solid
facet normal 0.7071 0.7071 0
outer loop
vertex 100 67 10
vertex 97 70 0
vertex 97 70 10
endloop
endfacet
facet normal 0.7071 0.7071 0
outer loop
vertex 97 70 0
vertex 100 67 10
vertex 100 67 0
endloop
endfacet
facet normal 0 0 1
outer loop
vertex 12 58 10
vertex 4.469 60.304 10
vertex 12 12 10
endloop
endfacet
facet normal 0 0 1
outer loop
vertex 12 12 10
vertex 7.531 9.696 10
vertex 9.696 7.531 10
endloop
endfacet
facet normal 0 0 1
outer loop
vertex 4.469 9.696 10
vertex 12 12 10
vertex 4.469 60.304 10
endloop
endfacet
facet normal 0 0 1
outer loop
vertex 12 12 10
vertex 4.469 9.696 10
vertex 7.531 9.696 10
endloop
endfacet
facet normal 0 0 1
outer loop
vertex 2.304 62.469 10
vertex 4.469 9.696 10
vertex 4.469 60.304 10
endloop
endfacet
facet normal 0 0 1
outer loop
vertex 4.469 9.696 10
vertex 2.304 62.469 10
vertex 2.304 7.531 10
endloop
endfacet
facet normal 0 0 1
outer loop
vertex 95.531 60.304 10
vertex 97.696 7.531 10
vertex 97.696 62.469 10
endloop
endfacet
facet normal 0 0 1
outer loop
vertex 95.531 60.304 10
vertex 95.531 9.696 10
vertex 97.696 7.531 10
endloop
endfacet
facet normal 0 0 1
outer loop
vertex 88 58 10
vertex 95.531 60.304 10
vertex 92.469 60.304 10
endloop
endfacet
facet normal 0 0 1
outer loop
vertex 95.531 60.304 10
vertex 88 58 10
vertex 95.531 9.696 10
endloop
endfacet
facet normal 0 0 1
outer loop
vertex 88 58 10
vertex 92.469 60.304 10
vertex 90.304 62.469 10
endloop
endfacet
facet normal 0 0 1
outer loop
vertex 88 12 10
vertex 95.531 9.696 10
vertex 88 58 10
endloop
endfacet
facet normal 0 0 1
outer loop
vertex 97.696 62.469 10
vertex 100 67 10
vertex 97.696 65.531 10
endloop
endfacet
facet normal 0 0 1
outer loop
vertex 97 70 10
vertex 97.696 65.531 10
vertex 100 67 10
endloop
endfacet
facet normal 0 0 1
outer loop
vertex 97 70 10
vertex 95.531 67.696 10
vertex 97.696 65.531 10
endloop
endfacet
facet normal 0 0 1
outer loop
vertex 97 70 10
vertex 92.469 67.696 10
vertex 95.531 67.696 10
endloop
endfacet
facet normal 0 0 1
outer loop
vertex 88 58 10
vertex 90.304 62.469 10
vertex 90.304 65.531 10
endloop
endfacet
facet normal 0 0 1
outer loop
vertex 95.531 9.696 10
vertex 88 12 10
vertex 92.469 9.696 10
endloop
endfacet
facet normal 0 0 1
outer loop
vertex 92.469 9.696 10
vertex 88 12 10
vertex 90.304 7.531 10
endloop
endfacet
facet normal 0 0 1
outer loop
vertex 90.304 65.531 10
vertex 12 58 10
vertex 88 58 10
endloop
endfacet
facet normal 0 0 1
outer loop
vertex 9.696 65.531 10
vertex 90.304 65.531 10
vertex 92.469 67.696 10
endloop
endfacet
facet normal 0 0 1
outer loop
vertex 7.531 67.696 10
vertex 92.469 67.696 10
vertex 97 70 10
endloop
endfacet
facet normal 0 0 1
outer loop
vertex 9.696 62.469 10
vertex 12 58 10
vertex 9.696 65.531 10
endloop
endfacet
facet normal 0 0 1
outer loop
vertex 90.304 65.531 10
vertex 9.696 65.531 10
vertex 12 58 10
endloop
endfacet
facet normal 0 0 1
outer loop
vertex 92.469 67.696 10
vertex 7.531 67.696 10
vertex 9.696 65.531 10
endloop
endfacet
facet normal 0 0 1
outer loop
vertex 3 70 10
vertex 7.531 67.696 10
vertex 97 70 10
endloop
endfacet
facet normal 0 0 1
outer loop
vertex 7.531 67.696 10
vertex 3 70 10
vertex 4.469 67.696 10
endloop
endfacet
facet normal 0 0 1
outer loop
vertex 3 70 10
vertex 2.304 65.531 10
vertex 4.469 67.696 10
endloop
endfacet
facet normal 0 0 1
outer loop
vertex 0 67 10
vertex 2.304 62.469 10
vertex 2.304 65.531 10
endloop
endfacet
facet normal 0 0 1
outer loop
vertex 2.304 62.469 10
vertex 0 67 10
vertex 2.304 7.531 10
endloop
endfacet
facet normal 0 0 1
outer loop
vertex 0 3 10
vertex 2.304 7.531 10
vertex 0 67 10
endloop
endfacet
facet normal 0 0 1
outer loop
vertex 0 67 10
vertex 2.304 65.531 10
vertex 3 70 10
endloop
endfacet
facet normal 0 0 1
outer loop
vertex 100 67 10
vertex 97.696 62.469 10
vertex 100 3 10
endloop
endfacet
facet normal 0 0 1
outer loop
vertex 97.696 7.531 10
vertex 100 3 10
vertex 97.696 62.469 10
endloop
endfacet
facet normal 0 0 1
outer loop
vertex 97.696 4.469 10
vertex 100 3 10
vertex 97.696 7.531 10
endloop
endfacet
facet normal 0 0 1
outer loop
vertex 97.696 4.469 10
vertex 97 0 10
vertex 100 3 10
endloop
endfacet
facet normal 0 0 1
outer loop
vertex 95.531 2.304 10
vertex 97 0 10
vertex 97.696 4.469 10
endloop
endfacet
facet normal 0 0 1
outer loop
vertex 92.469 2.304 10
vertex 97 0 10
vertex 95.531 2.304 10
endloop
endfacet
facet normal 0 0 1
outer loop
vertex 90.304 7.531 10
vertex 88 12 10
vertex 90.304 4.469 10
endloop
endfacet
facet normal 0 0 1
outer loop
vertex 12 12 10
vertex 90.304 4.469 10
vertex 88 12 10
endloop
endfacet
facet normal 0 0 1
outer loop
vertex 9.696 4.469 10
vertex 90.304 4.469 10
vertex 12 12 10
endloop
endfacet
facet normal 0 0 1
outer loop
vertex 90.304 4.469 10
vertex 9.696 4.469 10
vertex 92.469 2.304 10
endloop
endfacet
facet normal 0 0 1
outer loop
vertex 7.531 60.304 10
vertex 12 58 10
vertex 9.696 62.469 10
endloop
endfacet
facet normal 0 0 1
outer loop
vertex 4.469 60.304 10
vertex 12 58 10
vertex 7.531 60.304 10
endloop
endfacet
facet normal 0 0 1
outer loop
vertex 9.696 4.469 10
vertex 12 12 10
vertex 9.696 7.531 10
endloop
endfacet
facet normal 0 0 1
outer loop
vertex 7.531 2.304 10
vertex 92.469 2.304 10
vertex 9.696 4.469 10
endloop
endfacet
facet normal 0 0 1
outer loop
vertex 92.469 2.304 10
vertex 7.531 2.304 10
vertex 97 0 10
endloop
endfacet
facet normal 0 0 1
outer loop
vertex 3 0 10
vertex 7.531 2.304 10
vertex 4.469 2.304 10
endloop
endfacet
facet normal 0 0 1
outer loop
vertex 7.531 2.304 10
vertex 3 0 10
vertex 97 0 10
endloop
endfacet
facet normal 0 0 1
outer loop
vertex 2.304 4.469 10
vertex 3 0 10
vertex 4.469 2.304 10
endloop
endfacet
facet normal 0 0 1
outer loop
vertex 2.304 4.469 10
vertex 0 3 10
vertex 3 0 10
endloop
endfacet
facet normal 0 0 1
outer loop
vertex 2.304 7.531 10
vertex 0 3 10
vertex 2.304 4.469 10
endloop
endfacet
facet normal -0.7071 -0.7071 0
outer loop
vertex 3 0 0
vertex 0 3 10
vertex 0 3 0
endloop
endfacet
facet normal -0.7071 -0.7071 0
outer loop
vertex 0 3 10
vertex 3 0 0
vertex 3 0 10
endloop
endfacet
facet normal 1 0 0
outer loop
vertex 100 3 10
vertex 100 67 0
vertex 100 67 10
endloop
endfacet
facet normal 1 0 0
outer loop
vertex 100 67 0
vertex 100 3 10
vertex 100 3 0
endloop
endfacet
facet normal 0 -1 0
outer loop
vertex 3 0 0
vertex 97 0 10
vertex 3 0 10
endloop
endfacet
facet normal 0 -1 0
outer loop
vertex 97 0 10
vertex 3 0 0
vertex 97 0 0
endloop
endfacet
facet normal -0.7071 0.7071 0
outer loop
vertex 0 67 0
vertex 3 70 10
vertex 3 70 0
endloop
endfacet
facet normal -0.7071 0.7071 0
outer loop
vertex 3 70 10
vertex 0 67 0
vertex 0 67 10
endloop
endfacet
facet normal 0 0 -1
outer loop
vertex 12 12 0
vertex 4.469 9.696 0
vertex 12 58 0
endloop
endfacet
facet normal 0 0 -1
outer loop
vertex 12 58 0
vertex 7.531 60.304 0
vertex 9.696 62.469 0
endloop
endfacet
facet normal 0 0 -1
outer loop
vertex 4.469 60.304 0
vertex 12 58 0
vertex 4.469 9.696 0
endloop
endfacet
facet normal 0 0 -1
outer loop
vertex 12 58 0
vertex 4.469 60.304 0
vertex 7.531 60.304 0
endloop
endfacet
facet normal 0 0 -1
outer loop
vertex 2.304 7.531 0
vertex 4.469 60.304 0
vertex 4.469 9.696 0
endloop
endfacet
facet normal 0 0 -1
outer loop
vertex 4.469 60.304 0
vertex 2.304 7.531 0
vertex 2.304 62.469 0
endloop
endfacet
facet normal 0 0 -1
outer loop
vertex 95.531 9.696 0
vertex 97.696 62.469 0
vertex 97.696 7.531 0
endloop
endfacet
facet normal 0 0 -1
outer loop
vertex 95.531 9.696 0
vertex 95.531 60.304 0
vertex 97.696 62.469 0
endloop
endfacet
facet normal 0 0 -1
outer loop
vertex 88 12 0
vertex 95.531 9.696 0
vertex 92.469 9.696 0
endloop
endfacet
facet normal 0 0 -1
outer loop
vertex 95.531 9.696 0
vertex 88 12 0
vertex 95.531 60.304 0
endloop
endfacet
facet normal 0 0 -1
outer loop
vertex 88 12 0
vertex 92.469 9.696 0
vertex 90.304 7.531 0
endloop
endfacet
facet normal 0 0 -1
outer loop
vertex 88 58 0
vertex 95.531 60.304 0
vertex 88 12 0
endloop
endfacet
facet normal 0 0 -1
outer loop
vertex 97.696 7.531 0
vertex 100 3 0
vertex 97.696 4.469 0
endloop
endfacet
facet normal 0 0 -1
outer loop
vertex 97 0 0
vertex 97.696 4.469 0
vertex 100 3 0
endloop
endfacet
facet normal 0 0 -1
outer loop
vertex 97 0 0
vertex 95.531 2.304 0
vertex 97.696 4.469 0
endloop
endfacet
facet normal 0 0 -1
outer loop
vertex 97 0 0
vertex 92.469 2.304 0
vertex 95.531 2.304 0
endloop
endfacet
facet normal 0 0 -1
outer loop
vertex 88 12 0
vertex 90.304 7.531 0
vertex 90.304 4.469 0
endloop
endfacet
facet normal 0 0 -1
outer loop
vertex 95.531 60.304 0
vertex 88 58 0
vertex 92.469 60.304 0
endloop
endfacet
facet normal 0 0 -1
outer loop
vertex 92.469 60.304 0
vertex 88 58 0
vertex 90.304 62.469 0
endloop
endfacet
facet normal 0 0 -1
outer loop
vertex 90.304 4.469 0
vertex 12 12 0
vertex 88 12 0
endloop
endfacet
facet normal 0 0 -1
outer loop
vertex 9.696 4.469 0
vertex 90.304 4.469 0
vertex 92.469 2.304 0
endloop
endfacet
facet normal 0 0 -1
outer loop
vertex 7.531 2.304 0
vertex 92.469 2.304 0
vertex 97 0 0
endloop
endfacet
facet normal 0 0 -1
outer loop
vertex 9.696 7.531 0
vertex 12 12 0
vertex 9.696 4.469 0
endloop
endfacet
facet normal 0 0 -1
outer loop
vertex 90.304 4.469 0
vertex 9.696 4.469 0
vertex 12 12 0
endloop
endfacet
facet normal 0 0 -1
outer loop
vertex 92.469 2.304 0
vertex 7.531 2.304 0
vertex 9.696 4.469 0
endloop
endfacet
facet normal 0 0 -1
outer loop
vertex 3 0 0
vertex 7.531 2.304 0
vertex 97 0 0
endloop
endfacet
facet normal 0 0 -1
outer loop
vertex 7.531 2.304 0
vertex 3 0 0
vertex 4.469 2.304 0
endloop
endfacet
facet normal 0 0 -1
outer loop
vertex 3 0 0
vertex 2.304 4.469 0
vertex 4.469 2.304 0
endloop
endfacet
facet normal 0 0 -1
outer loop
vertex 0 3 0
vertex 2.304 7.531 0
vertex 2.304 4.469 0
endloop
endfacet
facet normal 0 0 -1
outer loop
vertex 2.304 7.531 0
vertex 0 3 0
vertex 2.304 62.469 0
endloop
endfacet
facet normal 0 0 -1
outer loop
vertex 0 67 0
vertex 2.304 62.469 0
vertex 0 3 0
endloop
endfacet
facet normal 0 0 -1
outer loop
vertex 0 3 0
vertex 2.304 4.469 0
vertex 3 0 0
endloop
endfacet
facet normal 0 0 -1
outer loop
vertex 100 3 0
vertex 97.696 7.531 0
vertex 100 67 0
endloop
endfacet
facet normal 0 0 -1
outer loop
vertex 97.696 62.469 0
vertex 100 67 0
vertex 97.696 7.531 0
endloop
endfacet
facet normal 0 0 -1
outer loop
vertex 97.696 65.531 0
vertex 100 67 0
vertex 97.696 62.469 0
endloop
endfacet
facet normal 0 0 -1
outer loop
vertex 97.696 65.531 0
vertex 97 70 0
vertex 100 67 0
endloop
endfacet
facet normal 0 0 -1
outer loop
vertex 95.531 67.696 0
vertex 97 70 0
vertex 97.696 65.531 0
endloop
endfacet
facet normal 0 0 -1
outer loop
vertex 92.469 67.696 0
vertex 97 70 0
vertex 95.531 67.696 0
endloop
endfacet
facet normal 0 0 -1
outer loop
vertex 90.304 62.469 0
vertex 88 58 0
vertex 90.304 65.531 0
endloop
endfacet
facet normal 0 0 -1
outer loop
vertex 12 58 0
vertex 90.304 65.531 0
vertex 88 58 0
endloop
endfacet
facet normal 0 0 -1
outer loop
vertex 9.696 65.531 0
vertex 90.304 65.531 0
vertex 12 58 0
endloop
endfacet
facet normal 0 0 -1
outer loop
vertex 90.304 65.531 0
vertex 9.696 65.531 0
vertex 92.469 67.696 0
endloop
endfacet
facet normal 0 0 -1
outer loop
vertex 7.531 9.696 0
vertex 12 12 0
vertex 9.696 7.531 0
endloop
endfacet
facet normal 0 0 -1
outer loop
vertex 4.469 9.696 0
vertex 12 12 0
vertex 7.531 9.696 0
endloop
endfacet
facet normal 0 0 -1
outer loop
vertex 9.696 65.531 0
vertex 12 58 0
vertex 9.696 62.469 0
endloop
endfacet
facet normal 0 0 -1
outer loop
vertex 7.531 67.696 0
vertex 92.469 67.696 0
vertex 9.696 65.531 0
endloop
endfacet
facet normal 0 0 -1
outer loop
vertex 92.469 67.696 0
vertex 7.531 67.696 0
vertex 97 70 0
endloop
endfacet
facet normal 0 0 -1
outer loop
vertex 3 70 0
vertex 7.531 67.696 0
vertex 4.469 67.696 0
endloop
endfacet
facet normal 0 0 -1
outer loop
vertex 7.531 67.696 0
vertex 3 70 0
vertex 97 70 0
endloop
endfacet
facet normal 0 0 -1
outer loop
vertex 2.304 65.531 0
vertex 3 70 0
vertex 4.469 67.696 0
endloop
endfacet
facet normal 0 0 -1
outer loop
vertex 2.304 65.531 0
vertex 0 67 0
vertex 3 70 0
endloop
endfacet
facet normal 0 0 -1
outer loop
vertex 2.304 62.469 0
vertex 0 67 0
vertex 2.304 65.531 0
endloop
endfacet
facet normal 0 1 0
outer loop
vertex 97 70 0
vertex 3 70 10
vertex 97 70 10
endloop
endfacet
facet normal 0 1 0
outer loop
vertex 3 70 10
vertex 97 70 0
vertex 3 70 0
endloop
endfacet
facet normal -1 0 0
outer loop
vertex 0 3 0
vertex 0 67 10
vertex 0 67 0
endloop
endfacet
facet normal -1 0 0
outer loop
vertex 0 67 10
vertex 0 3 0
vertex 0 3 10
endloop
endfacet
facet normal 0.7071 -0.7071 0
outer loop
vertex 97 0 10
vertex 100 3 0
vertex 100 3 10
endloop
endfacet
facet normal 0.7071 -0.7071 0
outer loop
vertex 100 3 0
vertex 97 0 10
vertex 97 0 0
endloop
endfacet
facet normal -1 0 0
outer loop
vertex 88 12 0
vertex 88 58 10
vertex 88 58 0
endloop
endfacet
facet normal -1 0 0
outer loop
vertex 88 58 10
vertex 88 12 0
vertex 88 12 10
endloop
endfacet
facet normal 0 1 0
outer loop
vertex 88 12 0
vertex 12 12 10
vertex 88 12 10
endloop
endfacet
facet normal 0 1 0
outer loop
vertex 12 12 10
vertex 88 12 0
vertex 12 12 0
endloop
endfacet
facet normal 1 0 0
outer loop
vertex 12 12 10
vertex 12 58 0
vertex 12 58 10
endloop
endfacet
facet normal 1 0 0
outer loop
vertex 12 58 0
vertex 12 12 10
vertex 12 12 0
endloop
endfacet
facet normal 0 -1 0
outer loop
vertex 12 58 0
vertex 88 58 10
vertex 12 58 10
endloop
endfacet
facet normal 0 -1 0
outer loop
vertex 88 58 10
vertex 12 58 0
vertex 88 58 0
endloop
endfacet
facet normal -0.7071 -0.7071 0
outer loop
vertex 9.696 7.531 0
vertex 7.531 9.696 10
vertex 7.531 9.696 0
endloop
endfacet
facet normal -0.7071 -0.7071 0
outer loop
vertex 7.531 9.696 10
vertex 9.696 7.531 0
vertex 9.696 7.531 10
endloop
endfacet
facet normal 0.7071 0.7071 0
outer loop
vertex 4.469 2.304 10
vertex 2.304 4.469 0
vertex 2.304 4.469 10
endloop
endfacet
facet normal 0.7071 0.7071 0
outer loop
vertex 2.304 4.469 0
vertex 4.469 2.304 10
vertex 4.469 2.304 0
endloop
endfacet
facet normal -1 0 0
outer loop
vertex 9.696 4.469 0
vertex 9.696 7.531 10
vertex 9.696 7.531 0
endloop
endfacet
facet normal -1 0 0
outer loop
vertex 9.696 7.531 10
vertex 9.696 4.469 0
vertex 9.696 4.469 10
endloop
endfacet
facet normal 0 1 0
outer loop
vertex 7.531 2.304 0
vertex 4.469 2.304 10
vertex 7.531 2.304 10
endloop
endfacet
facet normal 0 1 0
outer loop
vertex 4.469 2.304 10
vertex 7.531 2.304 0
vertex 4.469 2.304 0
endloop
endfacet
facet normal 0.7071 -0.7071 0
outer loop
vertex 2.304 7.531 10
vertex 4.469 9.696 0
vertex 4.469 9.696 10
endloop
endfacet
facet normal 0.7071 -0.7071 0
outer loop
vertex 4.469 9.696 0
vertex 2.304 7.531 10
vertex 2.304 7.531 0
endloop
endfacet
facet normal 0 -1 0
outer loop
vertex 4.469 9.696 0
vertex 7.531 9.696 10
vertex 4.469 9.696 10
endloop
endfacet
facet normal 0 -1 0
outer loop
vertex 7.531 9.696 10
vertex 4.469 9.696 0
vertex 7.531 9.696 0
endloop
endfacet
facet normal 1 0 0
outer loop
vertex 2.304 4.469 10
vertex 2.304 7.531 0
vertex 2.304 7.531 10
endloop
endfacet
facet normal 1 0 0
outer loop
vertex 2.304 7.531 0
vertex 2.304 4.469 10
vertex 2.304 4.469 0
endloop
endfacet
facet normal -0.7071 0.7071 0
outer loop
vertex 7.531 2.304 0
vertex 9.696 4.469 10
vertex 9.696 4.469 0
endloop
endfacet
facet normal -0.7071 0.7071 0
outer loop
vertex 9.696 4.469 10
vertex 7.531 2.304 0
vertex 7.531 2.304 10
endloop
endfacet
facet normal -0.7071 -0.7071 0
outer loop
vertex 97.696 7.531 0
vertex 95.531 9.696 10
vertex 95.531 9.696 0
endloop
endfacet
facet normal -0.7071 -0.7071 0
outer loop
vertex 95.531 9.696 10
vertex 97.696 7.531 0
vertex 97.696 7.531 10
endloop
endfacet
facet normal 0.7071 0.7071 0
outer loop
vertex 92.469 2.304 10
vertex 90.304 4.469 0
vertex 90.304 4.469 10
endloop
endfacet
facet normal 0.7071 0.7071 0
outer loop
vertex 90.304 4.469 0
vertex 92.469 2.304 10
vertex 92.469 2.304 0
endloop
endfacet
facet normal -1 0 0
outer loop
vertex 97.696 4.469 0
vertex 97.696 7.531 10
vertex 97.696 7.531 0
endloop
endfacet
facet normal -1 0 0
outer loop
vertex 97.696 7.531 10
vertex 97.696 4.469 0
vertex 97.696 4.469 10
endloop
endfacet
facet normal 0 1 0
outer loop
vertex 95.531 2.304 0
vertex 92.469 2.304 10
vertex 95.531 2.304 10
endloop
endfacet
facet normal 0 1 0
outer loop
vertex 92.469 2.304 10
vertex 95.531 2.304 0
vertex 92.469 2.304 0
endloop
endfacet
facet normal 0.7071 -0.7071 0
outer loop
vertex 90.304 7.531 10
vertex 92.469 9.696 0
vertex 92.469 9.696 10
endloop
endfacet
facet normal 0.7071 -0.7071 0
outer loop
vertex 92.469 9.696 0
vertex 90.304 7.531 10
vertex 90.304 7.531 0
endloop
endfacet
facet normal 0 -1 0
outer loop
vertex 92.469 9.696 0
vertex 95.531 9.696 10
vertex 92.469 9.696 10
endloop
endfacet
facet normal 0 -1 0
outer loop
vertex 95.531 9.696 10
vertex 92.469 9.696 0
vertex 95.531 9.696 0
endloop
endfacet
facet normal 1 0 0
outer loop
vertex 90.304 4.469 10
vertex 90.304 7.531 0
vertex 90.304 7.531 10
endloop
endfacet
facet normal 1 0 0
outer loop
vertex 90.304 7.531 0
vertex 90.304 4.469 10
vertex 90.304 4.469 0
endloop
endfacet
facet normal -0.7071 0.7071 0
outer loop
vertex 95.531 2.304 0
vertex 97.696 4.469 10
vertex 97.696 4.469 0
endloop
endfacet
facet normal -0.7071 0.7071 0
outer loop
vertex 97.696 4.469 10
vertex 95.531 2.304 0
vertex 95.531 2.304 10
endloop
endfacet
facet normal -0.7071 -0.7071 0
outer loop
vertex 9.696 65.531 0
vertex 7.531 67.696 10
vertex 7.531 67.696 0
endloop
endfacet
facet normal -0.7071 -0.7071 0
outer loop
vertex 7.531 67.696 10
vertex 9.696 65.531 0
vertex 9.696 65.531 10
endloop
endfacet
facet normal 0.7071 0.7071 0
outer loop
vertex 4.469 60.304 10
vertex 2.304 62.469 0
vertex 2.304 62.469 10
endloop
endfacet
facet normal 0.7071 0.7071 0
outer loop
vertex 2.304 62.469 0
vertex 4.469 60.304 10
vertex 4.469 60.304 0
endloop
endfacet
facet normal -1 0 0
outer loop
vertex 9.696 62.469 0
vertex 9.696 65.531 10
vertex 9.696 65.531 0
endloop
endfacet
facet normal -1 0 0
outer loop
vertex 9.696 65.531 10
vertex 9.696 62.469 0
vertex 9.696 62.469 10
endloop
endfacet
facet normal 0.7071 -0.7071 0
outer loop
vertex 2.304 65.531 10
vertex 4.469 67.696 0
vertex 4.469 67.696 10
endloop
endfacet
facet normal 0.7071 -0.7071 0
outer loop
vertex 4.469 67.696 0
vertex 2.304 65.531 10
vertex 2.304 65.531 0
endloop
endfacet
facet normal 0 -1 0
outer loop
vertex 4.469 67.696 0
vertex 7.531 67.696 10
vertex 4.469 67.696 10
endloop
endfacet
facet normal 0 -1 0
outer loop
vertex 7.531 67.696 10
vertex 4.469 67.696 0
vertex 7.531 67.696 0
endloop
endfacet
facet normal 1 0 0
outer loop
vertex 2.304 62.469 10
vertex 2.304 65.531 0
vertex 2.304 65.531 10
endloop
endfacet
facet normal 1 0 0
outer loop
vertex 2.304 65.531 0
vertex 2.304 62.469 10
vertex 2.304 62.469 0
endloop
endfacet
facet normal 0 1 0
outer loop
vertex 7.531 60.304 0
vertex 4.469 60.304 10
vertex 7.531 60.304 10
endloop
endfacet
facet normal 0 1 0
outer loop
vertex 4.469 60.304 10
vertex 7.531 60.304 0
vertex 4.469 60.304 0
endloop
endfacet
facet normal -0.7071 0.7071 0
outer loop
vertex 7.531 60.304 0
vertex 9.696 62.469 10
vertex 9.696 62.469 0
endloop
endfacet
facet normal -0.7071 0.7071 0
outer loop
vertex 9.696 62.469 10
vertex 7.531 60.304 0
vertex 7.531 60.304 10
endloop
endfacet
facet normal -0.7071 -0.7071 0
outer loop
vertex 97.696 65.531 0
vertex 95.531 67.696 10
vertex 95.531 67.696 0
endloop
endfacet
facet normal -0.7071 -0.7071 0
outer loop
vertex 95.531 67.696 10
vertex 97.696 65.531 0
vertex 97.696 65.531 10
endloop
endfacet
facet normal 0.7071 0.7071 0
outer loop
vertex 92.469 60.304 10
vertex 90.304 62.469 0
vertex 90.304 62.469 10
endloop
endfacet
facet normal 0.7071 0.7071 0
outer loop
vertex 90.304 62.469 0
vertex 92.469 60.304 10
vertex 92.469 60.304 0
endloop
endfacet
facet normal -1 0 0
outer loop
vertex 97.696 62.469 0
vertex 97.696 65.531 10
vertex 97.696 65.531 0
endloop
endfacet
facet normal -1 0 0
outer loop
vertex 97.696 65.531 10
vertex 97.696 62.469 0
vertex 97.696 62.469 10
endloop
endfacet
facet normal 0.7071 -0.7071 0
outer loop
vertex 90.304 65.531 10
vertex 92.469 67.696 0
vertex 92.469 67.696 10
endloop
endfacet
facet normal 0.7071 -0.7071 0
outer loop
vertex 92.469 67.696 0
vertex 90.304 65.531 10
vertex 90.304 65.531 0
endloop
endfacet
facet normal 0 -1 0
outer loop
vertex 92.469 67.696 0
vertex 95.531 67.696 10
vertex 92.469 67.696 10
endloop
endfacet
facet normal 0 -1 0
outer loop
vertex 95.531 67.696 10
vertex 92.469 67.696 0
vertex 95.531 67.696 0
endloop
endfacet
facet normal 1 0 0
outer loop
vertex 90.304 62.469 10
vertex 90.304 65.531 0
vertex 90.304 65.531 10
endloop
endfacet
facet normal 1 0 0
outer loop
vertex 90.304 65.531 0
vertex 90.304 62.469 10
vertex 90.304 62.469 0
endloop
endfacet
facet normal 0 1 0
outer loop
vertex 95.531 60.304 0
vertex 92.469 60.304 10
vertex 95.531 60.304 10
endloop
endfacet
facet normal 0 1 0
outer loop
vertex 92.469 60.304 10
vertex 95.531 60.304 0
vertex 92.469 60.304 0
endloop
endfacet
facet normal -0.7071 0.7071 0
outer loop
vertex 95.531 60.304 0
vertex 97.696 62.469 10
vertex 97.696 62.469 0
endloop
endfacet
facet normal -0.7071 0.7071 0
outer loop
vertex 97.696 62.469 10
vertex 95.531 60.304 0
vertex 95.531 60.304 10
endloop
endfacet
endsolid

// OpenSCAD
$fn = 32;

// ----------------------------------------------------------------------
// Frame plate: 100 x 70 frame, 12 mm rails
// ----------------------------------------------------------------------

// --- parameters (mm) ---
plate_l = 100;            // plate length, X
plate_w = 70;             // plate width, Y
plate_t = 10;             // plate thickness, Z (extrusion height)
corner_c = 3;             // corner chamfer
frame_bar = 12;           // frame rail width
bolt_r = 4;               // corner bolt window radius
bolt_inset = 6;           // bolt centre inset from the edges

win_l = plate_l - 2 * frame_bar;  // window length
win_w = plate_w - 2 * frame_bar;  // window width
bolt_d = 2 * bolt_r;  // corner hole diameter

profile = [[3, 0], [97, 0], [100, 3], [100, 67], [97, 70], [3, 70], [0, 67], [0, 3]];  // primary outline, 8 points, counter clockwise
void_1 = [[12, 12], [88, 12], [88, 58], [12, 58]];  // the window, 4 points
void_2 = [[9.696, 7.531], [7.531, 9.696], [4.469, 9.696], [2.304, 7.531], [2.304, 4.469], [4.469, 2.304], [7.531, 2.304], [9.696, 4.469]];  // corner bolt window, 8 points
void_3 = [[97.696, 7.531], [95.531, 9.696], [92.469, 9.696], [90.304, 7.531], [90.304, 4.469], [92.469, 2.304], [95.531, 2.304], [97.696, 4.469]];  // corner bolt window, 8 points
void_4 = [[9.696, 65.531], [7.531, 67.696], [4.469, 67.696], [2.304, 65.531], [2.304, 62.469], [4.469, 60.304], [7.531, 60.304], [9.696, 62.469]];  // corner bolt window, 8 points
void_5 = [[97.696, 65.531], [95.531, 67.696], [92.469, 67.696], [90.304, 65.531], [90.304, 62.469], [92.469, 60.304], [95.531, 60.304], [97.696, 62.469]];  // corner bolt window, 8 points

// --- the one profile operation ---
difference() {
  linear_extrude(height = plate_t) polygon(points = profile);
  translate([0, 0, -1])
    linear_extrude(height = plate_t + 2) polygon(points = void_1);
  translate([0, 0, -1])
    linear_extrude(height = plate_t + 2) polygon(points = void_2);
  translate([0, 0, -1])
    linear_extrude(height = plate_t + 2) polygon(points = void_3);
  translate([0, 0, -1])
    linear_extrude(height = plate_t + 2) polygon(points = void_4);
  translate([0, 0, -1])
    linear_extrude(height = plate_t + 2) polygon(points = void_5);
}
